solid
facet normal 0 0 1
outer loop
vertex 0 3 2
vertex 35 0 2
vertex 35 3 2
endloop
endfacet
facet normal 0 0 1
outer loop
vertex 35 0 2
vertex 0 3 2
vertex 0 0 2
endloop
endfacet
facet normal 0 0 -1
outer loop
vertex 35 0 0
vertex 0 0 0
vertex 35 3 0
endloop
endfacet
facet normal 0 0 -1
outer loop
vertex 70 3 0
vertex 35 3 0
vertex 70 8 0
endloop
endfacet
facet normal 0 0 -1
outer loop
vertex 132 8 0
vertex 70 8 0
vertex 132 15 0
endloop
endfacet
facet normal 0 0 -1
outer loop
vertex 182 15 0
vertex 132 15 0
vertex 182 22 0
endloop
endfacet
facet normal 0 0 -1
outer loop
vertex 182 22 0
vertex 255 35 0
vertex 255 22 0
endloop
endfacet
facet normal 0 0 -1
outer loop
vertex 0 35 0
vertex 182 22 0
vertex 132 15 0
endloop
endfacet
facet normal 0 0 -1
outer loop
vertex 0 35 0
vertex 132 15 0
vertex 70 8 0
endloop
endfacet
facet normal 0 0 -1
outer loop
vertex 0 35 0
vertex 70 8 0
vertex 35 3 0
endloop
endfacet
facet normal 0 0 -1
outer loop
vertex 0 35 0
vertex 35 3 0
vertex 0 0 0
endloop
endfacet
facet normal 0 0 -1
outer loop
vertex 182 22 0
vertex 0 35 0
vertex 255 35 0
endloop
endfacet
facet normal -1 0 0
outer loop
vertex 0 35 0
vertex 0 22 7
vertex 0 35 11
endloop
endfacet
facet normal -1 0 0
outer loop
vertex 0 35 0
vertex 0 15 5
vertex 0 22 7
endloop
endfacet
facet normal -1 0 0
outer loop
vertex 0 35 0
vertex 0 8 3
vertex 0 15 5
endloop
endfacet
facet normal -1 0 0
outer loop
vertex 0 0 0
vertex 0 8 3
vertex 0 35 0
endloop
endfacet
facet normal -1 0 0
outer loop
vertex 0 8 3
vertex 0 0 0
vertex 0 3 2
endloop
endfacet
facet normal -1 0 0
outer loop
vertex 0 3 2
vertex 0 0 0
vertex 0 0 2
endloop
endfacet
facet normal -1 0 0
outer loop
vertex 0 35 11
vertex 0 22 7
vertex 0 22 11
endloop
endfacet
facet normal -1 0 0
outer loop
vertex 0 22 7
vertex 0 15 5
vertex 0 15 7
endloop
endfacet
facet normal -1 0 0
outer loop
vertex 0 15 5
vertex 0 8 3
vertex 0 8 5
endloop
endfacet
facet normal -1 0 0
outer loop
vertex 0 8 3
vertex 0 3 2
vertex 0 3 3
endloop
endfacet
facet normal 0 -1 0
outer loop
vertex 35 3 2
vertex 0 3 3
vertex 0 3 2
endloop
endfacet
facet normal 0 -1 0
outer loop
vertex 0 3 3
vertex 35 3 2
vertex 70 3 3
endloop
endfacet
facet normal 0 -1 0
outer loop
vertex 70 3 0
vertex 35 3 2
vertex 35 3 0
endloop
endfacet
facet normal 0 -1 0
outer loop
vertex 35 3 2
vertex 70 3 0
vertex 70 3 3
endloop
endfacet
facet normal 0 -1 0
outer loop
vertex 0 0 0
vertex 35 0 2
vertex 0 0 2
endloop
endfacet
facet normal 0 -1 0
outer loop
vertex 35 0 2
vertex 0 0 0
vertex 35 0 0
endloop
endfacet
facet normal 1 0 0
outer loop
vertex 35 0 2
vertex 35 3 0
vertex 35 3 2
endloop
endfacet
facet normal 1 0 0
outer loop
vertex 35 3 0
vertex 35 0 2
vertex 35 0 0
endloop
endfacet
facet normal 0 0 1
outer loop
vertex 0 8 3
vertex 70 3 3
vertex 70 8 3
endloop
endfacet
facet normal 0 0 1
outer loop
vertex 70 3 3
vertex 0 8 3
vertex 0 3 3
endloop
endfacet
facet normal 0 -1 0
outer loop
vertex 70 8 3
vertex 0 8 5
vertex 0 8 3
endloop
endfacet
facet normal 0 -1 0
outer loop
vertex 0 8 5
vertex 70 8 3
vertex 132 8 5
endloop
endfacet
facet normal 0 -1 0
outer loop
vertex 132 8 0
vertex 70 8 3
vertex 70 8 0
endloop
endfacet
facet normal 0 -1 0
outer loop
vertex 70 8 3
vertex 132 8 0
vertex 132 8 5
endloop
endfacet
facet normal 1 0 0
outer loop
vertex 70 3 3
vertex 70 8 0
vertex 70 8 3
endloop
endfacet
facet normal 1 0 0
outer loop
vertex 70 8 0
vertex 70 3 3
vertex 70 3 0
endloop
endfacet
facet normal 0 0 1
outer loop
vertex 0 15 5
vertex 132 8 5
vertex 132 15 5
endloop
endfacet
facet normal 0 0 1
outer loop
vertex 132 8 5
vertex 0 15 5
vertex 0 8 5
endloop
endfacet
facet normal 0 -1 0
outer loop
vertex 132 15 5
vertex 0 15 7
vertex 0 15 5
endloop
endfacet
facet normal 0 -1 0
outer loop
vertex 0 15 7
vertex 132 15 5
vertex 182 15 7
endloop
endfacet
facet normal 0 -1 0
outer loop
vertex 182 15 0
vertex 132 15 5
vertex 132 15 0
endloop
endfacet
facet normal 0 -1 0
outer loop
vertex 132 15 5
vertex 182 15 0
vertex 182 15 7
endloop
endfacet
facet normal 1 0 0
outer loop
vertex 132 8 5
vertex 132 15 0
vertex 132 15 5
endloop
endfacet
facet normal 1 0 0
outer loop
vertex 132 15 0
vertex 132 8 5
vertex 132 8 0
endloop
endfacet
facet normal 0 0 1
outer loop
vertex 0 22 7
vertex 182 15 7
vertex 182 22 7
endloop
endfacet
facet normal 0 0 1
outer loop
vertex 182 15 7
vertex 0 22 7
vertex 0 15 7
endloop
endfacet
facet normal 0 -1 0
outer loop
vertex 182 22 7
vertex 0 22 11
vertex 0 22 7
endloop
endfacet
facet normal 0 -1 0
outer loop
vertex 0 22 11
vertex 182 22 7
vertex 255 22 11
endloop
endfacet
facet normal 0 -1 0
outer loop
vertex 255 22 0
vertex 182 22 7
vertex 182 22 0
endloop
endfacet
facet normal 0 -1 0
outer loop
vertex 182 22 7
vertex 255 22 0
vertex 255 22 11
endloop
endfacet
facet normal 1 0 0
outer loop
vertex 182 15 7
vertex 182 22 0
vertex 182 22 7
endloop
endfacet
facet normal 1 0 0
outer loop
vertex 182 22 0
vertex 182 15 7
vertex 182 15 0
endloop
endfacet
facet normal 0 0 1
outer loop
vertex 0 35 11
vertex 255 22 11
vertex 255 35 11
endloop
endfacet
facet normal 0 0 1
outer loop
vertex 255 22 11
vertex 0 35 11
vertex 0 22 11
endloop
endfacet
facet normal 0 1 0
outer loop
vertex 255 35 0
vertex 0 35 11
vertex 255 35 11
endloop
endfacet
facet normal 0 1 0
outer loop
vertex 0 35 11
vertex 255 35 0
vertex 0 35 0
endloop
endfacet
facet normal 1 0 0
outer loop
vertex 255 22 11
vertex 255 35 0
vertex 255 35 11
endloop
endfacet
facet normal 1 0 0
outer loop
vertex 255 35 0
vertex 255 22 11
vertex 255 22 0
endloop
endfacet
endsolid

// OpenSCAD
translate([2.5, 1.5, 1.0]) color([0.829940686628406, 0.0555270458896614, 0.035933833430188966]) cube([5, 3, 2], center=true);
translate([7.5, 1.5, 1.0]) color([0.4178660447962945, 0.49183095909626395, 0.8633251831082008]) cube([5, 3, 2], center=true);
translate([12.5, 1.5, 1.0]) color([0.7171887463451895, 0.6735438085995347, 0.15137377239978678]) cube([5, 3, 2], center=true);
translate([17.5, 1.5, 1.0]) color([0.9867059242186832, 0.41114019628748133, 0.6117708643248599]) cube([5, 3, 2], center=true);
translate([22.5, 1.5, 1.0]) color([0.38668300553323576, 0.04703291581184044, 0.4708892090480652]) cube([5, 3, 2], center=true);
translate([27.5, 1.5, 1.0]) color([0.15136775389483625, 0.03246546237394399, 0.6174004236810055]) cube([5, 3, 2], center=true);
translate([32.5, 1.5, 1.0]) color([0.6299662912183356, 0.10529282465636491, 0.5491437662317772]) cube([5, 3, 2], center=true);
translate([3.5, 5.5, 1.5]) color([0.3466679766399683, 0.3834140731648874, 0.7764198986996783]) cube([7, 5, 3], center=true);
translate([10.5, 5.5, 1.5]) color([0.49031967752424566, 0.8812766154122413, 0.6101197429062234]) cube([7, 5, 3], center=true);
translate([17.5, 5.5, 1.5]) color([0.4671884150380703, 0.6323126400553846, 0.3378653798287524]) cube([7, 5, 3], center=true);
translate([24.5, 5.5, 1.5]) color([0.12432379252825243, 0.6825296186925238, 0.622037442746657]) cube([7, 5, 3], center=true);
translate([31.5, 5.5, 1.5]) color([0.7885664913738635, 0.1271091249471088, 0.9117833181295222]) cube([7, 5, 3], center=true);
translate([38.5, 5.5, 1.5]) color([0.799341211421814, 0.9168874080910093, 0.8725347217734669]) cube([7, 5, 3], center=true);
translate([45.5, 5.5, 1.5]) color([0.681006446357057, 0.8102508494373589, 0.5190073092314018]) cube([7, 5, 3], center=true);
translate([52.5, 5.5, 1.5]) color([0.7854891493606652, 0.18912746785718504, 0.7821141063572942]) cube([7, 5, 3], center=true);
translate([59.5, 5.5, 1.5]) color([0.44457960405634067, 0.756616221297365, 0.4554702368121878]) cube([7, 5, 3], center=true);
translate([66.5, 5.5, 1.5]) color([0.7895587282777832, 0.07533958521856021, 0.04464090542441246]) cube([7, 5, 3], center=true);
translate([5.5, 11.5, 2.5]) color([0.9342895823715677, 0.4861651007487351, 0.9010713996489047]) cube([11, 7, 5], center=true);
translate([16.5, 11.5, 2.5]) color([0.9447832518820701, 0.6665111524556335, 0.5717968260934746]) cube([11, 7, 5], center=true);
translate([27.5, 11.5, 2.5]) color([0.21597938410680917, 0.09347621929900818, 0.8193942150822732]) cube([11, 7, 5], center=true);
translate([38.5, 11.5, 2.5]) color([0.8887720676319878, 0.7793957106948857, 0.6985024327316249]) cube([11, 7, 5], center=true);
translate([49.5, 11.5, 2.5]) color([0.42011111607482077, 0.3053115900269564, 0.11344489563770899]) cube([11, 7, 5], center=true);
translate([60.5, 11.5, 2.5]) color([0.425970248072163, 0.5660129742477574, 0.9228805831375125]) cube([11, 7, 5], center=true);
translate([71.5, 11.5, 2.5]) color([0.9357547693309531, 0.41564119654091314, 0.0992109880980957]) cube([11, 7, 5], center=true);
translate([82.5, 11.5, 2.5]) color([0.7738187324714434, 0.7342793416571158, 0.03070084595190614]) cube([11, 7, 5], center=true);
translate([93.5, 11.5, 2.5]) color([0.4467185991338365, 0.6864181042985581, 0.030134234552269934]) cube([11, 7, 5], center=true);
translate([104.5, 11.5, 2.5]) color([0.9192823534016137, 0.9622424865104192, 0.72254277208884]) cube([11, 7, 5], center=true);
translate([115.5, 11.5, 2.5]) color([0.0785385396518038, 0.07032946587635569, 0.3592533148212369]) cube([11, 7, 5], center=true);
translate([126.5, 11.5, 2.5]) color([0.029377507756986443, 0.3478777272843395, 0.009964241312966027]) cube([11, 7, 5], center=true);
translate([6.5, 18.5, 3.5]) color([0.9743235128409679, 0.8190066990688627, 0.07051761147818736]) cube([13, 7, 7], center=true);
translate([19.5, 18.5, 3.5]) color([0.8934350918478603, 0.20797804000401565, 0.20479079826934998]) cube([13, 7, 7], center=true);
translate([32.5, 18.5, 3.5]) color([0.6737591455288341, 0.9382622681625481, 0.12318812122923739]) cube([13, 7, 7], center=true);
translate([45.5, 18.5, 3.5]) color([0.007184567252270457, 0.3691301471700257, 0.024650014436155776]) cube([13, 7, 7], center=true);
translate([58.5, 18.5, 3.5]) color([0.6048482375805311, 0.8591756086192088, 0.1869917024228578]) cube([13, 7, 7], center=true);
translate([71.5, 18.5, 3.5]) color([0.11239103583018406, 0.34444960733861085, 0.9591715206073138]) cube([13, 7, 7], center=true);
translate([84.5, 18.5, 3.5]) color([0.13015769442868408, 0.9665192604669938, 0.36223986994484925]) cube([13, 7, 7], center=true);
translate([97.5, 18.5, 3.5]) color([0.47337040276011155, 0.29263198596497353, 0.9371268442154698]) cube([13, 7, 7], center=true);
translate([110.5, 18.5, 3.5]) color([0.9581478949874975, 0.6359157065077434, 0.18404555017515556]) cube([13, 7, 7], center=true);
translate([123.5, 18.5, 3.5]) color([0.9929517886102871, 0.10258043954691198, 0.5808493815940804]) cube([13, 7, 7], center=true);
translate([136.5, 18.5, 3.5]) color([0.15640306008300875, 0.8976753141502056, 0.9456783914956152]) cube([13, 7, 7], center=true);
translate([149.5, 18.5, 3.5]) color([0.8043902980001079, 0.3158914186681244, 0.2428386899579852]) cube([13, 7, 7], center=true);
translate([162.5, 18.5, 3.5]) color([0.7548584132190378, 0.291059519145354, 0.4197853778540753]) cube([13, 7, 7], center=true);
translate([175.5, 18.5, 3.5]) color([0.04625567690264132, 0.13223381043380655, 0.020549620641776678]) cube([13, 7, 7], center=true);
translate([8.5, 28.5, 5.5]) color([0.0779211200935358, 0.07321114936486084, 0.42023170217414685]) cube([17, 13, 11], center=true);
translate([25.5, 28.5, 5.5]) color([0.5507771776374378, 0.740878819870922, 0.14228347384241602]) cube([17, 13, 11], center=true);
translate([42.5, 28.5, 5.5]) color([0.4221887461694188, 0.6369660374117204, 0.08455569481893255]) cube([17, 13, 11], center=true);
translate([59.5, 28.5, 5.5]) color([0.44481115514620384, 0.3692560392397978, 0.9489319289416618]) cube([17, 13, 11], center=true);
translate([76.5, 28.5, 5.5]) color([0.05785711390101722, 0.40862622118314806, 0.41722547979620506]) cube([17, 13, 11], center=true);
translate([93.5, 28.5, 5.5]) color([0.728180504599678, 0.3206710028745039, 0.20399027594623398]) cube([17, 13, 11], center=true);
translate([110.5, 28.5, 5.5]) color([0.2933116551663051, 0.4708875424493587, 0.9502683295716211]) cube([17, 13, 11], center=true);
translate([127.5, 28.5, 5.5]) color([0.7965170227633064, 0.2769702457797433, 0.5581815883930463]) cube([17, 13, 11], center=true);
translate([144.5, 28.5, 5.5]) color([0.6882003035685332, 0.7956571556821322, 0.4461643839498476]) cube([17, 13, 11], center=true);
translate([161.5, 28.5, 5.5]) color([0.398776905129706, 0.7676407428212785, 0.43171649556411207]) cube([17, 13, 11], center=true);
translate([178.5, 28.5, 5.5]) color([0.2479576688970051, 0.4534470315306477, 0.9371046462904561]) cube([17, 13, 11], center=true);
translate([195.5, 28.5, 5.5]) color([0.14256748821860132, 0.4624353545272121, 0.6373035243637815]) cube([17, 13, 11], center=true);
translate([212.5, 28.5, 5.5]) color([0.48328798826810027, 0.20363990437036994, 0.0018431606156659175]) cube([17, 13, 11], center=true);
translate([229.5, 28.5, 5.5]) color([0.698991711803439, 0.6187355180234525, 0.007776649435864202]) cube([17, 13, 11], center=true);
translate([246.5, 28.5, 5.5]) color([0.2985601210181208, 0.7686342595428415, 0.6289203785446209]) cube([17, 13, 11], center=true);
